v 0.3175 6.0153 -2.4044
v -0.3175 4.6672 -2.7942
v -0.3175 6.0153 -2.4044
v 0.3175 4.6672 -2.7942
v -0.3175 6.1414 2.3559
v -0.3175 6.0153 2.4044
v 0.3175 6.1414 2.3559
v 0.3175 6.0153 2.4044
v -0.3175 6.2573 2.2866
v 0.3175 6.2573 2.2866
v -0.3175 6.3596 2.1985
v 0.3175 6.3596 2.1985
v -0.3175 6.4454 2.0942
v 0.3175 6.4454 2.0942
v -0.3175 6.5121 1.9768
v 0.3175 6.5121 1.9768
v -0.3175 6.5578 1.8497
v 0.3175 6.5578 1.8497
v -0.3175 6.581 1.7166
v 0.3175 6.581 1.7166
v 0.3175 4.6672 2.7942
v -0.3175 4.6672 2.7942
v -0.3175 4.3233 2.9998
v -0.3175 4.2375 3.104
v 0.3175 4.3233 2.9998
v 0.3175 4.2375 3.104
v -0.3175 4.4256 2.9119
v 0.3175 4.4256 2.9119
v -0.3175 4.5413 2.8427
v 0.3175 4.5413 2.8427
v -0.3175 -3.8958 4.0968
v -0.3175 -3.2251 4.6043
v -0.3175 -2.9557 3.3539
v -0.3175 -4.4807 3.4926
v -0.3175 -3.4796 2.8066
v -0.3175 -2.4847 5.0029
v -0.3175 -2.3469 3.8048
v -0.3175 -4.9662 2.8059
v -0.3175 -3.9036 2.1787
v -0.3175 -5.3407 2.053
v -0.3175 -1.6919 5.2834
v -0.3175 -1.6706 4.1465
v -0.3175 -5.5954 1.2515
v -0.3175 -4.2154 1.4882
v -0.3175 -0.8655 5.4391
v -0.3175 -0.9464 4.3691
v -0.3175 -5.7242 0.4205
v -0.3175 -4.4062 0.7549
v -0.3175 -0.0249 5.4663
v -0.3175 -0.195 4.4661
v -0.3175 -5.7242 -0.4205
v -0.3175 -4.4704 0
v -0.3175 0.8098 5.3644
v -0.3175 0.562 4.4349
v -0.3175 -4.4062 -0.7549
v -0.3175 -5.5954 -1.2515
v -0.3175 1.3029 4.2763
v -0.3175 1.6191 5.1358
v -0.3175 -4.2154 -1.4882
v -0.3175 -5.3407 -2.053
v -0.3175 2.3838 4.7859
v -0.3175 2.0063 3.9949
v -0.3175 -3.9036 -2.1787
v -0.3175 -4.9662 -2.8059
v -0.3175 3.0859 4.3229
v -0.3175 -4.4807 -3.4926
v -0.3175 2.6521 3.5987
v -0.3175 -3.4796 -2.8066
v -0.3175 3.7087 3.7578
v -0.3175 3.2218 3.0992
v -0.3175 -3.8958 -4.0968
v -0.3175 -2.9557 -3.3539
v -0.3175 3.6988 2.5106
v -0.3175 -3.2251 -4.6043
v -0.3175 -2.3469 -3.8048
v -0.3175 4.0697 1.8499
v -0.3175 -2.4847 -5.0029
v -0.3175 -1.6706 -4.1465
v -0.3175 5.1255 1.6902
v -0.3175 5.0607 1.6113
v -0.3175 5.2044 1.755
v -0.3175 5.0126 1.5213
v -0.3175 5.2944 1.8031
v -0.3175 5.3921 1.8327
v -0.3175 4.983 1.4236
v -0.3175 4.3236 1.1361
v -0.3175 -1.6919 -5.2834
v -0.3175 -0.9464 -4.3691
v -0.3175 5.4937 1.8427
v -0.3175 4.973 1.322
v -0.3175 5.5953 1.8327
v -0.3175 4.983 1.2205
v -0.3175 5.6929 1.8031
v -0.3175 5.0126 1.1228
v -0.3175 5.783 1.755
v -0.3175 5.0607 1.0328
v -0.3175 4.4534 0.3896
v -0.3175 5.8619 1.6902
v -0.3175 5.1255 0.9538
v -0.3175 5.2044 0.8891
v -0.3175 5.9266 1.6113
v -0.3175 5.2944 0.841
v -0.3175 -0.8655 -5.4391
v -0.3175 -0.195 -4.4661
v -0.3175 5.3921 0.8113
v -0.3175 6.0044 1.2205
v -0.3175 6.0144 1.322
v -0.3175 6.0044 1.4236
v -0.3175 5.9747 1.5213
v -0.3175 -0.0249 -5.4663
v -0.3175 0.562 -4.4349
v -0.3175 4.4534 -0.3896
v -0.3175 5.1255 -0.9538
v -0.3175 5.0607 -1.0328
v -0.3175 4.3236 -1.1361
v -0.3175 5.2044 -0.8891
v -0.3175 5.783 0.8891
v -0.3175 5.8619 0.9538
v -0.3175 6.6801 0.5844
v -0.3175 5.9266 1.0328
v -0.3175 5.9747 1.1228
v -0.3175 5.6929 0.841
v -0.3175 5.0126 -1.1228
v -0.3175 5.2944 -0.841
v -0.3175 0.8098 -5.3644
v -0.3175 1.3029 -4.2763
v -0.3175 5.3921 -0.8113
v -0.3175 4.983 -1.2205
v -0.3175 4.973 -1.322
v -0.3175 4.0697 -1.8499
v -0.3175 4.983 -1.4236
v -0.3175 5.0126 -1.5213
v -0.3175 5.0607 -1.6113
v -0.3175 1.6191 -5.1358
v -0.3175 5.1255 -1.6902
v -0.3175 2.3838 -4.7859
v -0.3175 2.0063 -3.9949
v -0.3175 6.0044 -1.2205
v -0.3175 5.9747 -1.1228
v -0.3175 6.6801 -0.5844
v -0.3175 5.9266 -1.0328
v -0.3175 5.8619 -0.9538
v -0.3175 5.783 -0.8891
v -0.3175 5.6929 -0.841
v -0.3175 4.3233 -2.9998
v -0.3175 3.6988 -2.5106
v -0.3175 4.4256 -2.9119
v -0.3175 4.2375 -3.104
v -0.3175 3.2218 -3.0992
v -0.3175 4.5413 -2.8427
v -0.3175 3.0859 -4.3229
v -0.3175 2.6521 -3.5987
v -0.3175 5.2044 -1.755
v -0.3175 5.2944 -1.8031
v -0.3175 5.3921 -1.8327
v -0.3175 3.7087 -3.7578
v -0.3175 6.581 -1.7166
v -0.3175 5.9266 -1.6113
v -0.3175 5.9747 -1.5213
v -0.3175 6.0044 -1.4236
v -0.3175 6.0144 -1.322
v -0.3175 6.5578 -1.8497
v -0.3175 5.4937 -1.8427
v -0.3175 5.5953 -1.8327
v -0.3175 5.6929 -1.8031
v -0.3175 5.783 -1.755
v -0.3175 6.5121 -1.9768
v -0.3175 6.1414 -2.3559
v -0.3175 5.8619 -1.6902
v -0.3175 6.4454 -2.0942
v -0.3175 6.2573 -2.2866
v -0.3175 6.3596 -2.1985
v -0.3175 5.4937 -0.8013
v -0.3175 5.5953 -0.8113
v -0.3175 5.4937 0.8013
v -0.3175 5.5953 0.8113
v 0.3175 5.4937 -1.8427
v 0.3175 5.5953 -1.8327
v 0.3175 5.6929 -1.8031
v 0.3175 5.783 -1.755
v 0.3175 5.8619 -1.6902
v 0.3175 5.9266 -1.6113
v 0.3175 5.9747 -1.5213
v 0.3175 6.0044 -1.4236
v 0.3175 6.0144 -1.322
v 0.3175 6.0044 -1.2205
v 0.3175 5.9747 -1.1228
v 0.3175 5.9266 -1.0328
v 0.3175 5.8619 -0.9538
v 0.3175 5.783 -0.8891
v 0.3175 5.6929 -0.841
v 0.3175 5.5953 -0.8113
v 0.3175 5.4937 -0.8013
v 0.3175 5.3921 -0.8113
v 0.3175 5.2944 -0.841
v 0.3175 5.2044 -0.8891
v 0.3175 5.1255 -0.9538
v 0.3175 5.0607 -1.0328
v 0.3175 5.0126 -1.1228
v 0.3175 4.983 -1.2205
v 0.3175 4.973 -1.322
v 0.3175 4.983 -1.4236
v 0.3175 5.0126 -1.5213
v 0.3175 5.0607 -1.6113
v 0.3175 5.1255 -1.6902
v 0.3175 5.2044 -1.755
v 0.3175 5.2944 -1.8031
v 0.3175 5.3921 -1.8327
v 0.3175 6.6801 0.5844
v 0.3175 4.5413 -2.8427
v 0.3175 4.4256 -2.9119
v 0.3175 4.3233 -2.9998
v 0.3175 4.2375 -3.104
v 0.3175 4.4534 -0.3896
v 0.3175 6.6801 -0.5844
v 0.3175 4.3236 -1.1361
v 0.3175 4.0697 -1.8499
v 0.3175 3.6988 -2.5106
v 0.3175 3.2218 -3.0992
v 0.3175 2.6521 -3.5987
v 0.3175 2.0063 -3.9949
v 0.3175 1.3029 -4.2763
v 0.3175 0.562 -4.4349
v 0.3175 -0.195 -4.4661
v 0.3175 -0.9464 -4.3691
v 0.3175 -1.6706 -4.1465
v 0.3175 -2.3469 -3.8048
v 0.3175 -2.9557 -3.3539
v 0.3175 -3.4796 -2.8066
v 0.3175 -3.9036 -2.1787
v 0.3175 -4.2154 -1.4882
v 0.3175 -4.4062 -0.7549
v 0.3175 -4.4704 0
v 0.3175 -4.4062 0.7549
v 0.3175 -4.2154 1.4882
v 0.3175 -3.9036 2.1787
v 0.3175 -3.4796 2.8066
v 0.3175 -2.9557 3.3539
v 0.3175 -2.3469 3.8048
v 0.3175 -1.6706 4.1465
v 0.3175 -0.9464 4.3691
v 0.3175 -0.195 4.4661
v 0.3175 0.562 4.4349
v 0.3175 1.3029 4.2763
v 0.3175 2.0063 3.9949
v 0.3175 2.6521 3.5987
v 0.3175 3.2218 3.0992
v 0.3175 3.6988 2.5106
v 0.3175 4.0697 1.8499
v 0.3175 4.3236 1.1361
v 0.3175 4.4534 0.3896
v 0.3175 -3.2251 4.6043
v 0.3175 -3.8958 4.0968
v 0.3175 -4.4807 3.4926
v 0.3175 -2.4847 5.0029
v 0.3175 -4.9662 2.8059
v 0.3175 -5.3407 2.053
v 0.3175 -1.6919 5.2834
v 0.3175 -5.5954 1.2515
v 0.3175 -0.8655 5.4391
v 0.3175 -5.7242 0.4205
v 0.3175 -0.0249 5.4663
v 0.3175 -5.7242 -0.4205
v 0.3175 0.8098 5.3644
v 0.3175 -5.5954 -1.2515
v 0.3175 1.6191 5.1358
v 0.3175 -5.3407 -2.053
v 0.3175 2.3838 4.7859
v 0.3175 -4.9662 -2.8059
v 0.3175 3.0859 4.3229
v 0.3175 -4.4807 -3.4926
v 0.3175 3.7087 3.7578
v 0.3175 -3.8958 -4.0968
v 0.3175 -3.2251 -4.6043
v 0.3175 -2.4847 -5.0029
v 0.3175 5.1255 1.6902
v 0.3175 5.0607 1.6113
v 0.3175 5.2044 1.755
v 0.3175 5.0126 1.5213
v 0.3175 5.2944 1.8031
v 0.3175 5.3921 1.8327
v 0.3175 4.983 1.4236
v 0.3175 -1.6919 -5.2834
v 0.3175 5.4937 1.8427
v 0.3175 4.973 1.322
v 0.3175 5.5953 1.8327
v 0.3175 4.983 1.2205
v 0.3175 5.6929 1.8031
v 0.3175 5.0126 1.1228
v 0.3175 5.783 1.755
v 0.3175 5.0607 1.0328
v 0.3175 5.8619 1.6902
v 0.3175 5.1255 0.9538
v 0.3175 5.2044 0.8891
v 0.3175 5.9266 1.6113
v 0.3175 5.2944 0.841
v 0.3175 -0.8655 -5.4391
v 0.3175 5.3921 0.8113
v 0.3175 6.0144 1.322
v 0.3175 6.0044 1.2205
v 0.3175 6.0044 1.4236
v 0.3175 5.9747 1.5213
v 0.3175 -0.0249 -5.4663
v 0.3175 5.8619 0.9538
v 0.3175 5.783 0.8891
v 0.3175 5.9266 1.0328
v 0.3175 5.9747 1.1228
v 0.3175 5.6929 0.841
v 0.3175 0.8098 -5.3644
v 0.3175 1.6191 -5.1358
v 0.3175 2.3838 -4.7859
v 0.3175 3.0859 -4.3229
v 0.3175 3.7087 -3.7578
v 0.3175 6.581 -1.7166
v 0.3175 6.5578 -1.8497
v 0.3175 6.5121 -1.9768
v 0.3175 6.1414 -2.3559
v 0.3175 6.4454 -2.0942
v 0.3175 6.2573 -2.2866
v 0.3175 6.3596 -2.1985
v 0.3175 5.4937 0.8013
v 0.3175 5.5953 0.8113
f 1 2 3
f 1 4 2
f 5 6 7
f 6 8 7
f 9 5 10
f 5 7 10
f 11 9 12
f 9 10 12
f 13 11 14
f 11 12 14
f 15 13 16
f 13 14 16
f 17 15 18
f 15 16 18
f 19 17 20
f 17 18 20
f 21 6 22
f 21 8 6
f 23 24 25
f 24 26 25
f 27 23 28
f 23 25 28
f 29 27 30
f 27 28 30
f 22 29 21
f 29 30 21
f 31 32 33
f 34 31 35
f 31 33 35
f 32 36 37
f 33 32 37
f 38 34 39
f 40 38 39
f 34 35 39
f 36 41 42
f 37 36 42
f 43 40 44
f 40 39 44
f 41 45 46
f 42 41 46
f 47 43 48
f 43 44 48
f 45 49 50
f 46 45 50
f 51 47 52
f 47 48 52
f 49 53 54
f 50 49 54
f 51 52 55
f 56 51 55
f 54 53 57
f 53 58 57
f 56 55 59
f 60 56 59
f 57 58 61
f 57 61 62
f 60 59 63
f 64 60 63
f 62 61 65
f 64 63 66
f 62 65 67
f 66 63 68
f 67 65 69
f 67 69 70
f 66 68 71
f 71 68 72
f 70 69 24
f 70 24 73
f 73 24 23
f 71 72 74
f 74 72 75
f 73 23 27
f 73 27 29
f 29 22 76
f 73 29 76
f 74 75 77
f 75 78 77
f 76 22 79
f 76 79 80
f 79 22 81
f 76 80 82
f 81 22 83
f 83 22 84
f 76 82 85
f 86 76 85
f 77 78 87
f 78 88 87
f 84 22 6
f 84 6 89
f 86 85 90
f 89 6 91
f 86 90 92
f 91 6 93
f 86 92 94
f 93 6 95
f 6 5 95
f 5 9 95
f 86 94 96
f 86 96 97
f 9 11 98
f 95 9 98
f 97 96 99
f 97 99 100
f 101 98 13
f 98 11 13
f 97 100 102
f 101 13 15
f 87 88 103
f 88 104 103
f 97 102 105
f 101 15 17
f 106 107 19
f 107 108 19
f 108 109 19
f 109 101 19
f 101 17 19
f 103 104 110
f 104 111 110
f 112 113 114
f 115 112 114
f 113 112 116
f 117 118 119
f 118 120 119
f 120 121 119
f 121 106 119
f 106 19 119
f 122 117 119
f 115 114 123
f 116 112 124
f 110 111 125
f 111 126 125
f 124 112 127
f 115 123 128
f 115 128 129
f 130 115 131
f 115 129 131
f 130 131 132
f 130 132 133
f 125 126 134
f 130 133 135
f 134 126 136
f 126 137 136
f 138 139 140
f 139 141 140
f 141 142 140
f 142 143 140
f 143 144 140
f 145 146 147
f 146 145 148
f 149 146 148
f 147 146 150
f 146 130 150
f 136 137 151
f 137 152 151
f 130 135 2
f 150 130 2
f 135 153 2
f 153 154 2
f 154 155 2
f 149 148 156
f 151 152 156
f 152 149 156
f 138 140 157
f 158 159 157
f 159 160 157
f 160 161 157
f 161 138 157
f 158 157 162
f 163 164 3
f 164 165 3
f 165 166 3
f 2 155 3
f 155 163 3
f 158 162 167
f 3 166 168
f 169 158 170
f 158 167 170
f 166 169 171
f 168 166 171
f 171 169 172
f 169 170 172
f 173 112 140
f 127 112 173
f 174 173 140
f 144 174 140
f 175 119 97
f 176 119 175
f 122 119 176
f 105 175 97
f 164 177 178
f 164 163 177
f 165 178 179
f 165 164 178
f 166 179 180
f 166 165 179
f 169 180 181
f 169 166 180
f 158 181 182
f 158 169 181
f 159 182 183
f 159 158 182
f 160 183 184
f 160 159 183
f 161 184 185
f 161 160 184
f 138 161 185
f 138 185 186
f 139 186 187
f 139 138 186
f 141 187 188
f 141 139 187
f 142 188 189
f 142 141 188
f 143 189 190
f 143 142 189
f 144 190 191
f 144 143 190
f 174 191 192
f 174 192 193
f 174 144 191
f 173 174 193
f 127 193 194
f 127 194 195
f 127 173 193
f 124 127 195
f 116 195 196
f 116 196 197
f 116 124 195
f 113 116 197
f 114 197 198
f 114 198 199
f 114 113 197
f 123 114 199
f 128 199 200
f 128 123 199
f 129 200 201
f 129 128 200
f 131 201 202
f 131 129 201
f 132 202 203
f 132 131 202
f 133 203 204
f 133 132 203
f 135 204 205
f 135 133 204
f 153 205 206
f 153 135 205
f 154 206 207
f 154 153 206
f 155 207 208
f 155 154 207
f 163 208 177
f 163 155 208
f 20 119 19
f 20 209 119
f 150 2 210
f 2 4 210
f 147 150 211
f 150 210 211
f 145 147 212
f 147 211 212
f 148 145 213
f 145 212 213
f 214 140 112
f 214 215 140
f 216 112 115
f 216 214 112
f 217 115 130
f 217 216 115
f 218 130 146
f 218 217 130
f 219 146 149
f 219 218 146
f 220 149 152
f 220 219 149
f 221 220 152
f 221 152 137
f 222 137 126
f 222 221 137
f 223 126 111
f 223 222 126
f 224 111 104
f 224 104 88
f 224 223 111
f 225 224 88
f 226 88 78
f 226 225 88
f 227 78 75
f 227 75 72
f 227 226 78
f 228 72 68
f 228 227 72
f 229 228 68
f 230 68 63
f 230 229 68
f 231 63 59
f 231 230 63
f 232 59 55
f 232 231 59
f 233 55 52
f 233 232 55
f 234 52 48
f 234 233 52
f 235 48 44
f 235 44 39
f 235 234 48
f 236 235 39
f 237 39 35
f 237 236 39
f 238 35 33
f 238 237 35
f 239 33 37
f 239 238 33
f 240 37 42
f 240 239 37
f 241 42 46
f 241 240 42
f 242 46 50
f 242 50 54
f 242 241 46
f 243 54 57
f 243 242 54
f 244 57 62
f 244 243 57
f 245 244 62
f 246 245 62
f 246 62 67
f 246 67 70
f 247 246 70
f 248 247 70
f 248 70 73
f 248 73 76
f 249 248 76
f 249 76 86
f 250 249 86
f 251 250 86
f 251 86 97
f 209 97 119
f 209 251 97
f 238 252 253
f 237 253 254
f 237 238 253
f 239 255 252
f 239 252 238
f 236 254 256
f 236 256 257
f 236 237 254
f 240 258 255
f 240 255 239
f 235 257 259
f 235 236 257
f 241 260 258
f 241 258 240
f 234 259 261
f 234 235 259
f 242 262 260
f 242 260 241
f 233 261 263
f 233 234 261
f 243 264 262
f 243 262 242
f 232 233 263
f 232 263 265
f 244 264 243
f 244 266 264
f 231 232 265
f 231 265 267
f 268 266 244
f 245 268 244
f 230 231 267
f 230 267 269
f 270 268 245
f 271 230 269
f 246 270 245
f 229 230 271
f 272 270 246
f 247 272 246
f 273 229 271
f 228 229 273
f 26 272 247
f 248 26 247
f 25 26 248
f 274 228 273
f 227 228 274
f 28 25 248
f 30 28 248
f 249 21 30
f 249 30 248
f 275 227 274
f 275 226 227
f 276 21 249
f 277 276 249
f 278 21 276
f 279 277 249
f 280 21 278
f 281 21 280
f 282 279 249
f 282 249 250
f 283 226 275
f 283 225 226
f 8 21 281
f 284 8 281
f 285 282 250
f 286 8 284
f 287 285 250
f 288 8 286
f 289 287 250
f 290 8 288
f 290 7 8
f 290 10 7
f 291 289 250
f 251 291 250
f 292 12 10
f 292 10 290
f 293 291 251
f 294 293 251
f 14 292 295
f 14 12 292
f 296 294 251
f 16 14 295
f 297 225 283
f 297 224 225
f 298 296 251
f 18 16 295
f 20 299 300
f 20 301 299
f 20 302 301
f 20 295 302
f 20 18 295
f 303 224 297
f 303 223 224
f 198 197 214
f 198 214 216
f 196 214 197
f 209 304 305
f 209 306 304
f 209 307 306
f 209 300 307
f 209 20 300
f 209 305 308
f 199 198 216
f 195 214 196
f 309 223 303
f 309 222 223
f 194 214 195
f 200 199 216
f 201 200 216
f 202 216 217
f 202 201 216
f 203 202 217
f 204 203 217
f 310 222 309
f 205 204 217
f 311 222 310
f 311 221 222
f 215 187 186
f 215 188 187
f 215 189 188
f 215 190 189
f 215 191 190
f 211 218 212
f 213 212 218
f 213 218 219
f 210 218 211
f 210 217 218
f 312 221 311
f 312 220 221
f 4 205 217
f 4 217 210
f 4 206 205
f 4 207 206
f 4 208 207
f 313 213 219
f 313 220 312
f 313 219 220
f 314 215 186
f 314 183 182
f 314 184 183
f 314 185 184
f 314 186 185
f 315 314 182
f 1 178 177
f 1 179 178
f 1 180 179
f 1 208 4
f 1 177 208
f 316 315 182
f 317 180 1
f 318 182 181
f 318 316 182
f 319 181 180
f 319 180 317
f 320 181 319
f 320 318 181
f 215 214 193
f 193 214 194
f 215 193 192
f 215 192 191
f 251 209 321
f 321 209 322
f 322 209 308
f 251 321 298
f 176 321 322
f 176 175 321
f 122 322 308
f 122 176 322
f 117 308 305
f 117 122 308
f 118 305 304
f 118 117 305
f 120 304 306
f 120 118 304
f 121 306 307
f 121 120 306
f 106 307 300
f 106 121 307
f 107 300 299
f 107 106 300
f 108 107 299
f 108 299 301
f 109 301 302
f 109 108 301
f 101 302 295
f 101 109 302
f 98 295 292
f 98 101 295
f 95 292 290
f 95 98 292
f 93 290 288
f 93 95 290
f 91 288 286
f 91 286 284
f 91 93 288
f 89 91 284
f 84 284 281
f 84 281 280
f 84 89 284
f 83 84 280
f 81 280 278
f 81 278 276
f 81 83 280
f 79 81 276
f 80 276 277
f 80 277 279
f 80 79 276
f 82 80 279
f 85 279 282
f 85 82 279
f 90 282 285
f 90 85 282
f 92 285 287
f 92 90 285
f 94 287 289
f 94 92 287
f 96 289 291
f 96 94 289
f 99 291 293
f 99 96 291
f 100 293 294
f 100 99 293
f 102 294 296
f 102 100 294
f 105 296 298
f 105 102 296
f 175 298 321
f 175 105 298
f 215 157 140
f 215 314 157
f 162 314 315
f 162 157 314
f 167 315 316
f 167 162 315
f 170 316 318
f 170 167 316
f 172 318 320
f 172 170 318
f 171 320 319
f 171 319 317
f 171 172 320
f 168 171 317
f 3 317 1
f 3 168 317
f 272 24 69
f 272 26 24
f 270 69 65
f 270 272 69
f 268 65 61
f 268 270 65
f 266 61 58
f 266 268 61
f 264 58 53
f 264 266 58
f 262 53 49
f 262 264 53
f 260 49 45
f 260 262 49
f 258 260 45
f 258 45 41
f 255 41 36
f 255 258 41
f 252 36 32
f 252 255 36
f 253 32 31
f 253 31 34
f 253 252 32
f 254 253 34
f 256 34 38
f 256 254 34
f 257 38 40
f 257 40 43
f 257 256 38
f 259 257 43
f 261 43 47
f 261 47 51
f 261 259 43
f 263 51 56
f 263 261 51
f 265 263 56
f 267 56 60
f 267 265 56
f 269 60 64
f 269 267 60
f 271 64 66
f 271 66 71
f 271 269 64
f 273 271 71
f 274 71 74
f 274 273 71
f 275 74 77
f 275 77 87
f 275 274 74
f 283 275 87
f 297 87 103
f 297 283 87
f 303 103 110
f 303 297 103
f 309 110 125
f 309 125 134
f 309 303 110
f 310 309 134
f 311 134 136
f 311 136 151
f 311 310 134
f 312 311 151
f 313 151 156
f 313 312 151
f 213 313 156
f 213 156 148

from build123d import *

# Parameters (mm, degrees)
SKETCH1_R      = 0.5207
EXTRUDE1_DEPTH = 0.3175
FILLET1_R      = 0.7874


with BuildPart() as part:
    # Sketch1 → Extrude1 (new body, symmetric)
    with BuildSketch(Plane(origin=(0, 0, 0), x_dir=(0, 0, -1), z_dir=(1, 0, 0))):
        with BuildLine():
            Line((-0.389621032, 4.453388778), (-0.584431549, 6.680083168))
            Line((-0.584431549, 6.680083168), (-2.25445234, 6.53397528))
            Line((-2.25445234, 6.53397528), (-2.87534029, 4.386740502))
            ThreePointArc((-2.87534029, 4.386740502), (0, -5.7404), (2.87534029, 4.386740502))
            Line((2.87534029, 4.386740502), (2.25445234, 6.53397528))
            Line((2.25445234, 6.53397528), (0.584431549, 6.680083168))
            Line((0.584431549, 6.680083168), (0.389621032, 4.453388778))
            ThreePointArc((0.389621032, 4.453388778), (0, -4.4704), (-0.389621032, 4.453388778))
        make_face()
        with Locations((-1.322036686, 5.493682029)):
            Circle(SKETCH1_R, mode=Mode.SUBTRACT)
        with Locations((1.322036686, 5.493682029)):
            Circle(SKETCH1_R, mode=Mode.SUBTRACT)
    extrude(amount=EXTRUDE1_DEPTH, both=True)

    # Fillet1
    fillet1_edges = [part.edges().sort_by_distance(p)[0] for p in [
        (0, 6.53397528, -2.25445234),
        (0, 4.386740502, -2.87534029),
        (0, 4.386740502, 2.87534029),
        (0, 6.53397528, 2.25445234),
    ]]
    fillet(fillet1_edges, radius=FILLET1_R)


solid = part.part
